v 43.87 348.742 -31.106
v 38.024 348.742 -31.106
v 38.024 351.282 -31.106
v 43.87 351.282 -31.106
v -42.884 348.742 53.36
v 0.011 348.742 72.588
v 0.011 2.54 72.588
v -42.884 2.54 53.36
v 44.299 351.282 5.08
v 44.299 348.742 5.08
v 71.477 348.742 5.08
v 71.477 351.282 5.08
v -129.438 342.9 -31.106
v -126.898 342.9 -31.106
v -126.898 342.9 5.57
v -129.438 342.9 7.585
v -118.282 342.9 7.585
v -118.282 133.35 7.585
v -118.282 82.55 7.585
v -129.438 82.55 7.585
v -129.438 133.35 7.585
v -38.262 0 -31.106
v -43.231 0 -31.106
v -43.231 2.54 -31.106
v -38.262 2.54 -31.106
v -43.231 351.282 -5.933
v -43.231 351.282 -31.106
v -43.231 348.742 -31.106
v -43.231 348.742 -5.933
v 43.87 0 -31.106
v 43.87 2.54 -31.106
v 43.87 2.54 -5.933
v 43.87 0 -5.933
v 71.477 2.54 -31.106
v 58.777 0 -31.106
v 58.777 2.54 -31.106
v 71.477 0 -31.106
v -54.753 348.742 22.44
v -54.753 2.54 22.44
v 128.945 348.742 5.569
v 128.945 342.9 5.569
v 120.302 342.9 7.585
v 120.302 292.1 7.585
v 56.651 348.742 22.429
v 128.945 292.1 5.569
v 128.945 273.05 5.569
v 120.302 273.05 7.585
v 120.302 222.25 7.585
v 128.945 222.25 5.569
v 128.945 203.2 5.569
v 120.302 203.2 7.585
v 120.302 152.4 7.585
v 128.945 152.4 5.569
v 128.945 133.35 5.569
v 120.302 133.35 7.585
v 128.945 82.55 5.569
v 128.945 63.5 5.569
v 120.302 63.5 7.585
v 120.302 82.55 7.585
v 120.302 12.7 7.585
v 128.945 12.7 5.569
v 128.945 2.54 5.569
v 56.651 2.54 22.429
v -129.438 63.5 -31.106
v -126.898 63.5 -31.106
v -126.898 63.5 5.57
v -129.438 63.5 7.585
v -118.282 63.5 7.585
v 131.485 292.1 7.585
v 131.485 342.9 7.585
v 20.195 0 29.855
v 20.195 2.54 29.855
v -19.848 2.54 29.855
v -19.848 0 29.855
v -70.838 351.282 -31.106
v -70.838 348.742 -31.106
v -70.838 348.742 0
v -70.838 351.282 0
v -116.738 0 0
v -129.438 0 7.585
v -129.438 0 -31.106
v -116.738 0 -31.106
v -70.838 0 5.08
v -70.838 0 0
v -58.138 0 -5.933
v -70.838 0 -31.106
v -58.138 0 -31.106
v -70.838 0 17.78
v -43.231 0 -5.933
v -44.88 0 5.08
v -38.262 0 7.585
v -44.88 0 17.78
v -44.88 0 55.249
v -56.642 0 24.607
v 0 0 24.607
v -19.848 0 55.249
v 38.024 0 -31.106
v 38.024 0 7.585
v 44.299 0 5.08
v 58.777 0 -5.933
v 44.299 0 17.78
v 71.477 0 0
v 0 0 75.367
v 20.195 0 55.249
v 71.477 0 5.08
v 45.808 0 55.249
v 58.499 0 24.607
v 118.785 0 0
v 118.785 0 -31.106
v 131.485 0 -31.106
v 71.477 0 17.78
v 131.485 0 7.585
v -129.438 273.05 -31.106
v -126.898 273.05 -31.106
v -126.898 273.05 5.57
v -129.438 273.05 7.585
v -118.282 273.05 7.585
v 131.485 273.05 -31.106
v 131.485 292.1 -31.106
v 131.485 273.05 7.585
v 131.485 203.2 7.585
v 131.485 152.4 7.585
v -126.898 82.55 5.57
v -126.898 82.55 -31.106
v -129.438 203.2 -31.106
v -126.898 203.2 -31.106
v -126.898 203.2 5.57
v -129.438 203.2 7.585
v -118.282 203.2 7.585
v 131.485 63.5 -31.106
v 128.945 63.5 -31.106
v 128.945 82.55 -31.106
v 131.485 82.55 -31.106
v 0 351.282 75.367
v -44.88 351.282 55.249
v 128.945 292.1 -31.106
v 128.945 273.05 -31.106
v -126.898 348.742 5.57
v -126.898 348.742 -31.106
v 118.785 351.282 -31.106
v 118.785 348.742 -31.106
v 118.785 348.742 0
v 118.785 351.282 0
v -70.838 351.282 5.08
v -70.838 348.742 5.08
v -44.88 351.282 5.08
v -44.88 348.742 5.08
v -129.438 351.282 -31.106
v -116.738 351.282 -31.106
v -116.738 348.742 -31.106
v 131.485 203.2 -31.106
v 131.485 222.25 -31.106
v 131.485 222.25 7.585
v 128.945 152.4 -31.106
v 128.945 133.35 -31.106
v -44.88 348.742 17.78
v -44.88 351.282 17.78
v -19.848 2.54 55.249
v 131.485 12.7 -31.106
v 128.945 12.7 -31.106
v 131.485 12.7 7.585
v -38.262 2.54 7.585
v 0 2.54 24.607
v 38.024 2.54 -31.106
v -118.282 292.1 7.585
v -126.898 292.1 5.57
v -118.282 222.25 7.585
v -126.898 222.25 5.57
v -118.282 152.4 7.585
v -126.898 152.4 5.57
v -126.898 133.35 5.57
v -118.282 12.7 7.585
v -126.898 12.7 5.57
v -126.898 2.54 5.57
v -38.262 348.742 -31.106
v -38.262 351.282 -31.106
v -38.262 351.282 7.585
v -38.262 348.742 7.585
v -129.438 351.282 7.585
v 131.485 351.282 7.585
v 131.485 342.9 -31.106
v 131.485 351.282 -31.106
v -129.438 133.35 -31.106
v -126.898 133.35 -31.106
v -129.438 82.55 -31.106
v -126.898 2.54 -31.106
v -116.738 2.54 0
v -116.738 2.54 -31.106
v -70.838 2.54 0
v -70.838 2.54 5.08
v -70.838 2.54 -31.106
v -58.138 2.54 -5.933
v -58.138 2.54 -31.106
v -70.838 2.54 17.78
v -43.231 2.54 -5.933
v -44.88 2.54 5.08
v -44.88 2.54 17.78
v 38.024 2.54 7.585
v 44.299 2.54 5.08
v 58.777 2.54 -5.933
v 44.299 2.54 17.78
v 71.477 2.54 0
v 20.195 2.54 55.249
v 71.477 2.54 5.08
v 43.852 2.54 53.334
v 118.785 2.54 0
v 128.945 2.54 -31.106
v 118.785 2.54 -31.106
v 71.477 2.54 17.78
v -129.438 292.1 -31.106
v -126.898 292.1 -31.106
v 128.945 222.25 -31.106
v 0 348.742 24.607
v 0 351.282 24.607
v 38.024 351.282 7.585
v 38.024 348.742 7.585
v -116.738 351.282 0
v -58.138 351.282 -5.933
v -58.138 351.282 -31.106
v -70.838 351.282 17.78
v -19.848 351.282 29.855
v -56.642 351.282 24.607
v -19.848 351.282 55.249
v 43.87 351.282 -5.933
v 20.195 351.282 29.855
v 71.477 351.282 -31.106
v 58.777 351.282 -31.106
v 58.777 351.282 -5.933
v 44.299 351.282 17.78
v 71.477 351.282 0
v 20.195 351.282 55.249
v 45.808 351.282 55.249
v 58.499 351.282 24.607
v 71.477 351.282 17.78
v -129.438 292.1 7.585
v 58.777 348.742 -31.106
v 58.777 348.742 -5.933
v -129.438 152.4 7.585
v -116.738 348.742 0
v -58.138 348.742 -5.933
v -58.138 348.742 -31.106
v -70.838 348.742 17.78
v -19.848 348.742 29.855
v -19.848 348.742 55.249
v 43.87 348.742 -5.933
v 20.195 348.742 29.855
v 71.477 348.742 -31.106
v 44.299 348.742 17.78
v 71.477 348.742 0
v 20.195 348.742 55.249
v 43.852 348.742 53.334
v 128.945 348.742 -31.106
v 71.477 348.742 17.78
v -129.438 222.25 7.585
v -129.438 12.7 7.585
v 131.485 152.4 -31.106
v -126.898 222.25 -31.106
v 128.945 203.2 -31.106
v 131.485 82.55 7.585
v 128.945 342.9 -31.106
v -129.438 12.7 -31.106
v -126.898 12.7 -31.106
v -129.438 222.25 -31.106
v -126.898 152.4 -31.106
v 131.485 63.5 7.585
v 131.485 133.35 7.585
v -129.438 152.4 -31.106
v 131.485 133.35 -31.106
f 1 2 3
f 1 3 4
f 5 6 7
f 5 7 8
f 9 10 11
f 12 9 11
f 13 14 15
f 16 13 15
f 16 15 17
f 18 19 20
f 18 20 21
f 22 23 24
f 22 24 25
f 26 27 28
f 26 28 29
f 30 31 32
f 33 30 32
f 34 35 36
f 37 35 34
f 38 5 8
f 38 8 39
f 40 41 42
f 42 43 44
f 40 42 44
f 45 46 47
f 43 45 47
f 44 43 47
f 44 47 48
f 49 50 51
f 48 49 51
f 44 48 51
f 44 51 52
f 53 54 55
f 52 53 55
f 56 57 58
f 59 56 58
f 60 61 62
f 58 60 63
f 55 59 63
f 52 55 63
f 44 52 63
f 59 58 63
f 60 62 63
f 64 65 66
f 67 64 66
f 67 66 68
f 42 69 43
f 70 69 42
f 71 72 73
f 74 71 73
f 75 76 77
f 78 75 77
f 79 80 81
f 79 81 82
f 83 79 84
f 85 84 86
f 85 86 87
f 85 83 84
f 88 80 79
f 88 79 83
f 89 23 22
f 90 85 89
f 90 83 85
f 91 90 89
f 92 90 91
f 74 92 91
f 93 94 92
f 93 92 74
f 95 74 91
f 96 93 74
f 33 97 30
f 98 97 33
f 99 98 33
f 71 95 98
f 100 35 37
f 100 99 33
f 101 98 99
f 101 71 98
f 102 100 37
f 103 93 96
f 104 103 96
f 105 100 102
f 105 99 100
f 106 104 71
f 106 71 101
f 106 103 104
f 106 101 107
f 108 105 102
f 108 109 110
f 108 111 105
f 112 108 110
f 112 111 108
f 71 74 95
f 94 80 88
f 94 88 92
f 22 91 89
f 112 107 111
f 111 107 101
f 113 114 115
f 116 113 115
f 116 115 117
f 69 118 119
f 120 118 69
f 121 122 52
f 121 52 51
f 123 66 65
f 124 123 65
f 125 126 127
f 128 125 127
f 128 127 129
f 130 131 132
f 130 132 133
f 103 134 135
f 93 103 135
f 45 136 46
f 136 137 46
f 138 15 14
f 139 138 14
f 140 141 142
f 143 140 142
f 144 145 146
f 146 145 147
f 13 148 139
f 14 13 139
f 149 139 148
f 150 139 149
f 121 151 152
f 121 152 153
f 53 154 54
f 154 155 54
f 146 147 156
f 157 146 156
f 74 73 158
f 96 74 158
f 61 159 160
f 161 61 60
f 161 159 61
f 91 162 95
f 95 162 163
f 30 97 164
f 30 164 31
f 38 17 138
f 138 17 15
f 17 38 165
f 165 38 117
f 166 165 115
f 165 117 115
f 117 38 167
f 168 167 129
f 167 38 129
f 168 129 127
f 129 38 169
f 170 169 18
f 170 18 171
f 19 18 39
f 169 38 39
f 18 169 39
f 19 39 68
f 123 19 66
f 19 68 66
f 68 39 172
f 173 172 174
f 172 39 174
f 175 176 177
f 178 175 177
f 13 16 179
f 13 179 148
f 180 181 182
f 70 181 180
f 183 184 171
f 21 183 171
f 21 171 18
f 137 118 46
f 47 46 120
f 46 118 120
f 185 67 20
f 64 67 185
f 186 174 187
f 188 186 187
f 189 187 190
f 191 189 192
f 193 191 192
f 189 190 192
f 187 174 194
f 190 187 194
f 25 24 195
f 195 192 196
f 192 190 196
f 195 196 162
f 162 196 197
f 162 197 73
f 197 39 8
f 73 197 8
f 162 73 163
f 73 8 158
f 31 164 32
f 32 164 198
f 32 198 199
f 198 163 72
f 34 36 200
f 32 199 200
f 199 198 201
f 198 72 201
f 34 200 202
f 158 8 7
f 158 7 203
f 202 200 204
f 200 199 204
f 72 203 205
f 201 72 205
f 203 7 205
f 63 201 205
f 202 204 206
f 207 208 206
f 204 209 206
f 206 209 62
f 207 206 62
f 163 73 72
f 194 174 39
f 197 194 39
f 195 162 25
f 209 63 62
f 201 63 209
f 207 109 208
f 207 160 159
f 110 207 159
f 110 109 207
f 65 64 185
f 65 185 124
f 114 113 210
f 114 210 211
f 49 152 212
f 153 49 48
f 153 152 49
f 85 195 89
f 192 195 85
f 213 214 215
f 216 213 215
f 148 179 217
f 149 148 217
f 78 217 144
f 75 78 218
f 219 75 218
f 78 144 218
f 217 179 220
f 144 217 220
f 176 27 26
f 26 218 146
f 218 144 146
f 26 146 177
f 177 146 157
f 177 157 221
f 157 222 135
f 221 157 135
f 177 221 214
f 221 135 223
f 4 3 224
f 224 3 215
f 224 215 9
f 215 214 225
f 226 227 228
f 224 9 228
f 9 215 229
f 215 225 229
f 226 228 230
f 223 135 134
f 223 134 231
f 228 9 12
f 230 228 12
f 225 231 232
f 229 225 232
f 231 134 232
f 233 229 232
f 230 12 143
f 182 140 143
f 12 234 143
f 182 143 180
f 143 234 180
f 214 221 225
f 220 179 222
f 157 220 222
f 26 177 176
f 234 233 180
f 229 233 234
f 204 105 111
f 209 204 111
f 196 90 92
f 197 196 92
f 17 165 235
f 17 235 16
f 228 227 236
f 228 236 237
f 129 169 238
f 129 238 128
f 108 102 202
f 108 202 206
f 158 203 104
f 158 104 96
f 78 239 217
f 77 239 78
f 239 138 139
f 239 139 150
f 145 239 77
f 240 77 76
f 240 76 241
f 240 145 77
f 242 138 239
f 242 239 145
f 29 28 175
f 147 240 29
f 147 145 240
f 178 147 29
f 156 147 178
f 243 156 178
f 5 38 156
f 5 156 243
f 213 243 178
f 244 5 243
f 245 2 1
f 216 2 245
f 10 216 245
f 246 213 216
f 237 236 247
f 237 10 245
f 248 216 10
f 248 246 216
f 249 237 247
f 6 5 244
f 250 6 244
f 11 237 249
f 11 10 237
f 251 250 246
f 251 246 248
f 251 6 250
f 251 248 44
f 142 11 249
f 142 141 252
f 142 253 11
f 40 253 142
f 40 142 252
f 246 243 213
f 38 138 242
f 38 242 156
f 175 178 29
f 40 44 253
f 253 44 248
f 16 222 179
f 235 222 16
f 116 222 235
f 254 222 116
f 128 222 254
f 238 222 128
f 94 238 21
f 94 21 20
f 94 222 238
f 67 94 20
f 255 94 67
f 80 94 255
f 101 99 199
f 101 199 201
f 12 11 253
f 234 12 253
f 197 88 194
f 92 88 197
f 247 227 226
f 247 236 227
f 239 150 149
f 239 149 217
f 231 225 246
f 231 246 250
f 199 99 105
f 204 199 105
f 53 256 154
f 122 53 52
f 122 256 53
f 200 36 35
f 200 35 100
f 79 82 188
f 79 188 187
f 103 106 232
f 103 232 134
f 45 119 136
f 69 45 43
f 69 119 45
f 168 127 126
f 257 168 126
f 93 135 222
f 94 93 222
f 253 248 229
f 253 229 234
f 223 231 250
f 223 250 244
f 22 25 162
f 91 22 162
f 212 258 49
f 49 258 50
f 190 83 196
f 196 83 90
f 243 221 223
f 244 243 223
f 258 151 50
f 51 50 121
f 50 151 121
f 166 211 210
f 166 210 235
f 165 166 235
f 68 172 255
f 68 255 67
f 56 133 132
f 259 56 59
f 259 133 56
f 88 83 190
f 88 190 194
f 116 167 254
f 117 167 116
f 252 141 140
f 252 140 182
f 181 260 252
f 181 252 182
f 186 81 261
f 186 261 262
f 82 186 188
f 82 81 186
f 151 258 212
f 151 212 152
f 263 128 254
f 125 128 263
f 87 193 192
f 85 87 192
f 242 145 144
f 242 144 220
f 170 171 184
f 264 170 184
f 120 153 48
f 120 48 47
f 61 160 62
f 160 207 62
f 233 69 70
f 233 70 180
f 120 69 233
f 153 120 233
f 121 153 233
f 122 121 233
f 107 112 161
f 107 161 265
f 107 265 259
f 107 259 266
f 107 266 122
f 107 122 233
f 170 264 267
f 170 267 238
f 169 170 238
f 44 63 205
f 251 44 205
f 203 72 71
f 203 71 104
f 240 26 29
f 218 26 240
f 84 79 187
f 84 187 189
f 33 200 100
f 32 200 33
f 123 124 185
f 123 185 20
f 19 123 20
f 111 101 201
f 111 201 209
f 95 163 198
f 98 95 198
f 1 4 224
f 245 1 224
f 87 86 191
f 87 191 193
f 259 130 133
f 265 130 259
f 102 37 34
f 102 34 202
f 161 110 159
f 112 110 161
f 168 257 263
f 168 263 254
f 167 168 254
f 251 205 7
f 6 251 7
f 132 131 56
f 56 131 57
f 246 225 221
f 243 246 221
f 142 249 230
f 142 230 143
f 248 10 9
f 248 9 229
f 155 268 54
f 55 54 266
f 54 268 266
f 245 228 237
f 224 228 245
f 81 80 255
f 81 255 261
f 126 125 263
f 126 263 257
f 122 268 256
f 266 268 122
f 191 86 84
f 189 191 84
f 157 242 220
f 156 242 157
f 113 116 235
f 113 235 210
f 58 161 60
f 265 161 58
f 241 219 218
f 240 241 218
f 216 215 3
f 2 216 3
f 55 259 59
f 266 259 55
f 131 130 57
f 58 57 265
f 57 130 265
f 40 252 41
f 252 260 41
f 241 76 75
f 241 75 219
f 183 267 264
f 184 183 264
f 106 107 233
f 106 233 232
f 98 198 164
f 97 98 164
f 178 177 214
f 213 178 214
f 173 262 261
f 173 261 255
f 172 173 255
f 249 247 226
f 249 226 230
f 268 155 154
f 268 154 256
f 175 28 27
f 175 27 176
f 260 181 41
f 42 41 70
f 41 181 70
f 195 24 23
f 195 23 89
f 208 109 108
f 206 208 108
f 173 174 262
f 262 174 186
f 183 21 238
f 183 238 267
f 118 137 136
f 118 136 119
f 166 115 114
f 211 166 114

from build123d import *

# Parameters (mm, degrees)
F1_DEPTH = 351.282
F2_T     = -2.54
F3_W     = 40.0430839509
F3_H     = 25.3932625055
F3_W_2   = 14.9065516889
F3_H_2   = 25.1731947064
F4_DEPTH = 508
F5_W     = 50.8
F5_H     = 38.6911868118
F6_DEPTH = 558.8
F7_W     = 45.9006593287
F7_H     = 31.1064030975
F7_W_2   = 25.9576785982
F7_H_2   = 12.7
F7_W_3   = 27.178
F7_W_4   = 47.3086998522
F8_DEPTH = 762


with BuildPart() as f1:
    # F0 (on Front) → F1 (new body)
    with BuildSketch(Plane.XZ):
        Polygon((-44.8798835278, 55.2486851811), (-56.6415078938, 24.6065575629), (-129.4382214546, 7.5847837143), (-129.4382214546, -31.1064030975), (131.4852535725, -31.1064030975), (131.4852535725, 7.5847837143), (58.4986023605, 24.6065575629), (45.8084307611, 55.2486851811), (0, 75.367256999), align=None)
    extrude(amount=-F1_DEPTH)

    # F2
    f2_openings = [f1.faces().sort_by_distance(p)[0] for p in [
        (1.023516, 175.641, -31.106403),
    ]]
    offset(amount=F2_T, openings=f2_openings, kind=Kind.INTERSECTION)

    # F3 (on face) → F4 (cut)
    with BuildSketch(Plane(origin=(0, 351.282, 0), x_dir=(-1, 0, 0), z_dir=(0, 1, 0))):
        with Locations((-0.1733517274, 42.5520539284)):
            Rectangle(F3_W, F3_H)
        with Locations((50.6842862815, -18.5198057443)):
            Rectangle(F3_W_2, F3_H_2)
        with Locations((-51.3232778758, -18.5198057443)):
            Rectangle(F3_W_2, F3_H_2)
        Polygon((-38.0242951214, -31.1064030975), (0, -31.1064030975), (38.2621623576, -31.1064030975), (38.2621623576, 7.5847837143), (0, 24.6065575629), (-38.0242951214, 7.5847837143), align=None)
    extrude(amount=-F4_DEPTH, mode=Mode.SUBTRACT)

    # F5 (on face) → F6 (cut)
    with BuildSketch(Plane.YZ.offset(131.4852535725)):
        with Locations((38.1, -11.7608096916)):
            Rectangle(F5_W, F5_H)
        with Locations((107.95, -11.7608096916)):
            Rectangle(F5_W, F5_H)
        with Locations((177.8, -11.7608096916)):
            Rectangle(F5_W, F5_H)
        with Locations((247.65, -11.7608096916)):
            Rectangle(F5_W, F5_H)
        with Locations((317.5, -11.7608096916)):
            Rectangle(F5_W, F5_H)
    extrude(amount=-F6_DEPTH, mode=Mode.SUBTRACT)

    # F7 (on face) → F8 (cut)
    with BuildSketch(Plane.XZ):
        with Locations((-93.7878917903, -15.5532015488)):
            Rectangle(F7_W, F7_H)
        with Locations((-57.8587228268, 11.43)):
            Rectangle(F7_W_2, F7_H_2)
        with Locations((57.8875537202, 11.43)):
            Rectangle(F7_W_3, F7_H_2)
        with Locations((95.1309036463, -15.5532015488)):
            Rectangle(F7_W_4, F7_H)
    extrude(amount=-F8_DEPTH, mode=Mode.SUBTRACT)


solid = f1.part
